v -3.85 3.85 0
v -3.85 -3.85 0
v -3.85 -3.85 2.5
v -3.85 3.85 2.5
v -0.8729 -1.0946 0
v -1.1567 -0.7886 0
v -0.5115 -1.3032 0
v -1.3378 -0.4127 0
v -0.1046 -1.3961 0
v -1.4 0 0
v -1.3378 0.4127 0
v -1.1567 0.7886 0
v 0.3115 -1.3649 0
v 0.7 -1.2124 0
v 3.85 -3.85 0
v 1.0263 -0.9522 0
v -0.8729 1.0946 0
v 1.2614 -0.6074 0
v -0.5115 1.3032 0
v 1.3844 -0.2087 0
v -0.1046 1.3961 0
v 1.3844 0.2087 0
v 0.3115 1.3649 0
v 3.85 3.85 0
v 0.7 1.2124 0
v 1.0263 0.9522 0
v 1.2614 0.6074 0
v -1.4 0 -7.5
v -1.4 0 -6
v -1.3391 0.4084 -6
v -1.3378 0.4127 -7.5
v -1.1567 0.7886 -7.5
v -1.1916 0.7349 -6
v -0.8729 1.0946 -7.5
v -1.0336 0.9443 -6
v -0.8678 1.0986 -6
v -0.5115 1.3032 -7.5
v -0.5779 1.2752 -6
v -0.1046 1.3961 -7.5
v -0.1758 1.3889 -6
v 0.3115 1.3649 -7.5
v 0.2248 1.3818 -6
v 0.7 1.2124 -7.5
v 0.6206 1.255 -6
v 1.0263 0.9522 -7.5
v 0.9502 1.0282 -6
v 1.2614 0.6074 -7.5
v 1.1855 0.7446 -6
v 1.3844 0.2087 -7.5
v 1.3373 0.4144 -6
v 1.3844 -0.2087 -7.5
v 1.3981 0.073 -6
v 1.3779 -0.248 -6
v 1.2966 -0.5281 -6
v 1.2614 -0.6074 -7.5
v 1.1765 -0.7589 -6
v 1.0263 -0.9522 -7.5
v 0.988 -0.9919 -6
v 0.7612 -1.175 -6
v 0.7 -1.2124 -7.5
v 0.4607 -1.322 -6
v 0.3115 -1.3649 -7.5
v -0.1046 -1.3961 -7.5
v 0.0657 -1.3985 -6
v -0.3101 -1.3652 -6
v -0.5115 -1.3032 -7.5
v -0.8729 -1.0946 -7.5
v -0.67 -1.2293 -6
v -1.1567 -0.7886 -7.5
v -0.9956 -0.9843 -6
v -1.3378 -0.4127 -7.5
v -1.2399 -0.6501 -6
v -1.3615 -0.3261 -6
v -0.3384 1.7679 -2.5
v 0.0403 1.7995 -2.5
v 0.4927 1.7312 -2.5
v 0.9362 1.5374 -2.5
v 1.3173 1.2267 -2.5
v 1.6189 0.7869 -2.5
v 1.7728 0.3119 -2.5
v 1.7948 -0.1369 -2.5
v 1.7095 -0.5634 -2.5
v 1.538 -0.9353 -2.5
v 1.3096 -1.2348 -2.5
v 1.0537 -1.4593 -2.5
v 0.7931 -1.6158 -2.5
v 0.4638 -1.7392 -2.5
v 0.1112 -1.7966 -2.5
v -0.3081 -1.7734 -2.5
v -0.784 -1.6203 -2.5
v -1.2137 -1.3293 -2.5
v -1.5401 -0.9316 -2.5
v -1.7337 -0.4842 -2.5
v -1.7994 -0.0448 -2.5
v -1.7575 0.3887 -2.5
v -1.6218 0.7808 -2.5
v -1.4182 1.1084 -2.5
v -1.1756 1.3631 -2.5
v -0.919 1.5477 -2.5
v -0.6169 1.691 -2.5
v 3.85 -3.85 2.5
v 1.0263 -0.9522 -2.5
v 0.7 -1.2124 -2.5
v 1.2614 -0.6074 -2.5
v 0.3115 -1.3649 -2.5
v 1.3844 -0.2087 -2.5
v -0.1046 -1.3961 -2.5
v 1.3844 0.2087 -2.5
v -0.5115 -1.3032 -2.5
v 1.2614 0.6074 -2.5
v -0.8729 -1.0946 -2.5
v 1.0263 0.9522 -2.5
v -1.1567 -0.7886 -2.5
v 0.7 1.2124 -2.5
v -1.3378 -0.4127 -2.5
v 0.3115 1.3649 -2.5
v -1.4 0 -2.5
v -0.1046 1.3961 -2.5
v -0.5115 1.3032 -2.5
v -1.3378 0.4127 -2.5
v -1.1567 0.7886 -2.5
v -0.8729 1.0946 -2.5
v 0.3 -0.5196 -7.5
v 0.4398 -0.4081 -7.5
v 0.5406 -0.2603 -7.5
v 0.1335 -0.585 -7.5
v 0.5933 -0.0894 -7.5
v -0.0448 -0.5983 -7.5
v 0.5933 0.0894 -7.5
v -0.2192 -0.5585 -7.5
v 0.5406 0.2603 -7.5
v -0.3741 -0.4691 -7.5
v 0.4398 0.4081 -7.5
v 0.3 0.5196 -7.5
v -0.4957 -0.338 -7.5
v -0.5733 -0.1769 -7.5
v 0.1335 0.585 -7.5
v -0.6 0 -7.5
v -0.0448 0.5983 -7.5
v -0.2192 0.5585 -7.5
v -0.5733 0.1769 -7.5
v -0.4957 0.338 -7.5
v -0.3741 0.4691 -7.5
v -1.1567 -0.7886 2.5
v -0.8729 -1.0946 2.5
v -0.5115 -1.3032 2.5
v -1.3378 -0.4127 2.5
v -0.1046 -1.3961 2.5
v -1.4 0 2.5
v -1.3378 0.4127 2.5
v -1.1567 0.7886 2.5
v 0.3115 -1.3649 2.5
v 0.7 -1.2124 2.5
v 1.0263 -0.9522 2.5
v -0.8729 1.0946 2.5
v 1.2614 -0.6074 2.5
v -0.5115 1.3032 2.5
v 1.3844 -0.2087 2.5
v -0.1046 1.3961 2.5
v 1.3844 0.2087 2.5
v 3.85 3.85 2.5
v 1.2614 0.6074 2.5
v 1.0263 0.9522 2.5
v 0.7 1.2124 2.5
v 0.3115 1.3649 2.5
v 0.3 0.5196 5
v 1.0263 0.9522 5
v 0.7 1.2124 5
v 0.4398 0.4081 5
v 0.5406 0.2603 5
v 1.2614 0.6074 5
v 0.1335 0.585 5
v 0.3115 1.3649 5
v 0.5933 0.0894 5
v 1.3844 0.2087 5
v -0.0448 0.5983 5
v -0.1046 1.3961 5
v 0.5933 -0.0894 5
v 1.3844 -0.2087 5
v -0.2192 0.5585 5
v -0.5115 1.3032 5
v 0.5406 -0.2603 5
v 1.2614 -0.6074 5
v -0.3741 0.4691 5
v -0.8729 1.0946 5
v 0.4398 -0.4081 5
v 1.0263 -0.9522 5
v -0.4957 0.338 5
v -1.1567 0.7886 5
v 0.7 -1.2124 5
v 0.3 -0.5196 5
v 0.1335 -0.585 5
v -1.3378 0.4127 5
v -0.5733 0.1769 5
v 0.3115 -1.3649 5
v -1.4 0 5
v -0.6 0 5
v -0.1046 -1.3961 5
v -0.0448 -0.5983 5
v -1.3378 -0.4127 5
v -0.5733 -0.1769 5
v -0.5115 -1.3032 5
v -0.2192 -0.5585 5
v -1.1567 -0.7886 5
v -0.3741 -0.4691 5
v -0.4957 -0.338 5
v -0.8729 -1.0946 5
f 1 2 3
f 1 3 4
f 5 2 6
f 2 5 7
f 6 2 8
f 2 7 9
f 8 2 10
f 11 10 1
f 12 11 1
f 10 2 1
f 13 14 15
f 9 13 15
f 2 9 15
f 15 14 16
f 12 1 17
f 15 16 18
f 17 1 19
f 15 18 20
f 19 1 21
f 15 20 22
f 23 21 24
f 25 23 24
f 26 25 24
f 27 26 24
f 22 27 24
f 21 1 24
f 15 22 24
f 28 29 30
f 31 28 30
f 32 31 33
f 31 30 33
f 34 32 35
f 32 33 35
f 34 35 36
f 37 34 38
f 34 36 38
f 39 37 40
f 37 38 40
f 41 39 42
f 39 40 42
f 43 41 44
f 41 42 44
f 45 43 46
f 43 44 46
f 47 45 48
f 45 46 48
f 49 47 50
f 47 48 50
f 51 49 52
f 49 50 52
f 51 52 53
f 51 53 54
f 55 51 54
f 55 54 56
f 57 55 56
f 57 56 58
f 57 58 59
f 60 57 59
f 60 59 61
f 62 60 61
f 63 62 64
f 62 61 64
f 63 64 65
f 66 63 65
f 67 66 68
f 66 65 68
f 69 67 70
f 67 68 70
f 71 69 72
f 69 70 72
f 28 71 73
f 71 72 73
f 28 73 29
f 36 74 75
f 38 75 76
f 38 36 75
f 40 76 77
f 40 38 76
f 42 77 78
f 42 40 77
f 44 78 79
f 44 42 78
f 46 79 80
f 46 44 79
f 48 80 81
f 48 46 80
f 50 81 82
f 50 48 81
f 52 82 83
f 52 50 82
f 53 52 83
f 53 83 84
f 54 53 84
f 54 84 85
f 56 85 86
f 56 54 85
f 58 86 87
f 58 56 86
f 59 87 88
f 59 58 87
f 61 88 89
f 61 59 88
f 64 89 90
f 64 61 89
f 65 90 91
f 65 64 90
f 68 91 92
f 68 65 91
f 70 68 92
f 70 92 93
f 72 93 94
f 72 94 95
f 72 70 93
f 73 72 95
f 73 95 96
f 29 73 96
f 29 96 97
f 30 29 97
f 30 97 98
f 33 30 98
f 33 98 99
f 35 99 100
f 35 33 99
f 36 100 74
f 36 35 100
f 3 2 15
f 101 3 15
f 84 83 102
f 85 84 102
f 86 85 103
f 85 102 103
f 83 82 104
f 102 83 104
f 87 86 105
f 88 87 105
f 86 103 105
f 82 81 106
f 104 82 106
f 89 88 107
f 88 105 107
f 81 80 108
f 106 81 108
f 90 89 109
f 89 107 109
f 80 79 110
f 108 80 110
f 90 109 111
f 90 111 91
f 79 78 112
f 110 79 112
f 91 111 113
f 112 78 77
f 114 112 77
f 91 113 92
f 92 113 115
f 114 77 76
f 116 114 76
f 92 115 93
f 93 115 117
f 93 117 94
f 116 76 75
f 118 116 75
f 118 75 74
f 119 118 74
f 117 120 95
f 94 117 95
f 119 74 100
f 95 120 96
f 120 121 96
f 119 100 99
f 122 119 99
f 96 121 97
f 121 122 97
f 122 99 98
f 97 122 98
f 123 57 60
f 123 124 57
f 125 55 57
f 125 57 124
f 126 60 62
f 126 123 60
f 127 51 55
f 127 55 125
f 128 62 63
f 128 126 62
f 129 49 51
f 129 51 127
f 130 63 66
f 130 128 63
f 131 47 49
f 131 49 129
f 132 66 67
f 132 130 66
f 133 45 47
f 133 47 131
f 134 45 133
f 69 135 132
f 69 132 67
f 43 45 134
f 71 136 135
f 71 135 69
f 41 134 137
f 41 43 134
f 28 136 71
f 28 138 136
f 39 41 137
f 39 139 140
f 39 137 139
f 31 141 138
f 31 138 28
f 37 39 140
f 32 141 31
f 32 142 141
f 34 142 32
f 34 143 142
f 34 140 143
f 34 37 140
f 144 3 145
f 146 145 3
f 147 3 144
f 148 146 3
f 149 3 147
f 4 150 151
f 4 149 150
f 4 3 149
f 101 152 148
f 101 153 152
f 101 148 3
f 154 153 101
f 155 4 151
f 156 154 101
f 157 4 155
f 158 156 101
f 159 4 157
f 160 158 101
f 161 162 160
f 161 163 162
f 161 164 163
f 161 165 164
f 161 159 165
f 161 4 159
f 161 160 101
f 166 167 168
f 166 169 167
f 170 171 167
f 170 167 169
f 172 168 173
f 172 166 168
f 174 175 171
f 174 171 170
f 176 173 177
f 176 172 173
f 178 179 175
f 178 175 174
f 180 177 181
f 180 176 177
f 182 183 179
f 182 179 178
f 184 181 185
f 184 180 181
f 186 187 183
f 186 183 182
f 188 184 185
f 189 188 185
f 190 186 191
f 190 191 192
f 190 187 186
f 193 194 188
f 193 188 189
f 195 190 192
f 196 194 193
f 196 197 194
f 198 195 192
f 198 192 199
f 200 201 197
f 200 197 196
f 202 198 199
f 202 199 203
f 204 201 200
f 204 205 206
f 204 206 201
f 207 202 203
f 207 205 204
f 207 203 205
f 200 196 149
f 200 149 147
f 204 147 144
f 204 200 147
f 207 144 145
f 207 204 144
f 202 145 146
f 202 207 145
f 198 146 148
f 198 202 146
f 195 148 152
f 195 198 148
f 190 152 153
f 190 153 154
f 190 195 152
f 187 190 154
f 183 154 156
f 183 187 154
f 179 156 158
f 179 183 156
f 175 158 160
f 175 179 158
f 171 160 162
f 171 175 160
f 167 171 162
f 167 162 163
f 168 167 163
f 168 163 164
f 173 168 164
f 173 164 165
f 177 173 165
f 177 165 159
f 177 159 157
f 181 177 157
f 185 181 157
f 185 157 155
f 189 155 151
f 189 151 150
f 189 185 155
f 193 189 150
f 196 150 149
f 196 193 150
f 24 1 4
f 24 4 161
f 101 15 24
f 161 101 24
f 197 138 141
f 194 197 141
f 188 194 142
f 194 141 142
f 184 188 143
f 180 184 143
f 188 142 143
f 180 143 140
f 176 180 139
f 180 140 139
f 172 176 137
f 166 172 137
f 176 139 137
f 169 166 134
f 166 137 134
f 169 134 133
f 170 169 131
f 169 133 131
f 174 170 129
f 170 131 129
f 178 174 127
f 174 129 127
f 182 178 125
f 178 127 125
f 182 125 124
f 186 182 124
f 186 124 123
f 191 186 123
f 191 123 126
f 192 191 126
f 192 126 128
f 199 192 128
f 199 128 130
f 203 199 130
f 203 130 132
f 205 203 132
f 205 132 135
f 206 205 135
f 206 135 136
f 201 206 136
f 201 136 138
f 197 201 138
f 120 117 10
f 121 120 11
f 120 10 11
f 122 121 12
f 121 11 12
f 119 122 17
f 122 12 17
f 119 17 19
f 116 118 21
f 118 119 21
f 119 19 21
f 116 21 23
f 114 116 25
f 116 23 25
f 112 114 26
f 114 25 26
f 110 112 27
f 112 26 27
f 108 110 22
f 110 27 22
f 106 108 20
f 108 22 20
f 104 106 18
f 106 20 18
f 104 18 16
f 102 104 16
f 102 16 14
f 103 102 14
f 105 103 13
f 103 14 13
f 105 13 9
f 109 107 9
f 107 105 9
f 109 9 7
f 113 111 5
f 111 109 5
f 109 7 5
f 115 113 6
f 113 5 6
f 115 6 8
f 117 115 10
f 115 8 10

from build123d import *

# Parameters (mm, degrees)
CROQUIS1_W              = 7.7
CROQUIS1_H              = 7.7
SALIENTE_EXTRUIR1_DEPTH = 2.5
CROQUIS2_R              = 1.4
SALIENTE_EXTRUIR2_DEPTH = 7.5
SALIENTE_EXTRUIR3_START = 2.5
CROQUIS7_R              = 1.4
SALIENTE_EXTRUIR3_DEPTH = 2.5
CROQUIS6_R              = 0.6
CORTAR_EXTRUIR1_DEPTH   = 14.634331667


with BuildPart() as part:
    # Croquis1 → Saliente-Extruir1 (new body)
    with BuildSketch(Plane.XY):
        Rectangle(CROQUIS1_W, CROQUIS1_H)
    extrude(amount=SALIENTE_EXTRUIR1_DEPTH)

    # Croquis2 → Saliente-Extruir2 (add)
    with BuildSketch(Plane(origin=(0, 0, 0), x_dir=(-1, 0, 0), z_dir=(0, 0, -1))):
        Circle(CROQUIS2_R)
    extrude(amount=SALIENTE_EXTRUIR2_DEPTH)

    # Recubrir2: read off the stored shape, not the designer's step
    # Recubrir2: loft between two sections, ruled curve by curve
    recubrir2_from = [
        Edge.make_bspline([(-0.33839724, 1.767904779, -2.5), (3.197412318, 2.44469926, -2.5), (3.874206798, -1.091110298, -2.5), (0.33839724, -1.767904779, -2.5), (-3.197412318, -2.44469926, -2.5), (-3.874206798, 1.091110298, -2.5), (-0.33839724, 1.767904779, -2.5)], [0, 0, 0, 0, 0.5, 0.5, 0.5, 1, 1, 1, 1], 3, [1, 0.333333333, 0.333333333, 1, 0.333333333, 0.333333333, 1]),
    ]
    recubrir2_to = [
        Edge.make_bspline([(-0.867767345, 1.09862634, -6), (1.329485334, 2.83416103, -6), (3.065020025, 0.636908351, -6), (0.867767345, -1.09862634, -6), (-1.329485334, -2.83416103, -6), (-3.065020025, -0.636908351, -6), (-0.867767345, 1.09862634, -6)], [0, 0, 0, 0, 0.5, 0.5, 0.5, 1, 1, 1, 1], 3, [1, 0.333333333, 0.333333333, 1, 0.333333333, 0.333333333, 1]),
    ]
    recubrir2 = Solid(Shell([*[Face.make_surface_from_curves(recubrir2_from[k], recubrir2_to[k]) for k in range(1)], Face(Wire(recubrir2_from)), Face(Wire(recubrir2_to))]))
    add(recubrir2)

    # Croquis7 → Saliente-Extruir3 (add)
    with BuildSketch(Plane.XY.offset(2.5).offset(SALIENTE_EXTRUIR3_START)):
        with Locations(Location((0, 0, 0), (0, 0, 180))):
            Circle(CROQUIS7_R)
    extrude(amount=-SALIENTE_EXTRUIR3_DEPTH)

    # Croquis6 → Cortar-Extruir1 (cut, through all)
    with BuildSketch(Plane(origin=(0, 0, -7.5), x_dir=(-1, 0, 0), z_dir=(0, 0, -1))):
        Circle(CROQUIS6_R)
    extrude(amount=-CORTAR_EXTRUIR1_DEPTH, mode=Mode.SUBTRACT)


solid = part.part
